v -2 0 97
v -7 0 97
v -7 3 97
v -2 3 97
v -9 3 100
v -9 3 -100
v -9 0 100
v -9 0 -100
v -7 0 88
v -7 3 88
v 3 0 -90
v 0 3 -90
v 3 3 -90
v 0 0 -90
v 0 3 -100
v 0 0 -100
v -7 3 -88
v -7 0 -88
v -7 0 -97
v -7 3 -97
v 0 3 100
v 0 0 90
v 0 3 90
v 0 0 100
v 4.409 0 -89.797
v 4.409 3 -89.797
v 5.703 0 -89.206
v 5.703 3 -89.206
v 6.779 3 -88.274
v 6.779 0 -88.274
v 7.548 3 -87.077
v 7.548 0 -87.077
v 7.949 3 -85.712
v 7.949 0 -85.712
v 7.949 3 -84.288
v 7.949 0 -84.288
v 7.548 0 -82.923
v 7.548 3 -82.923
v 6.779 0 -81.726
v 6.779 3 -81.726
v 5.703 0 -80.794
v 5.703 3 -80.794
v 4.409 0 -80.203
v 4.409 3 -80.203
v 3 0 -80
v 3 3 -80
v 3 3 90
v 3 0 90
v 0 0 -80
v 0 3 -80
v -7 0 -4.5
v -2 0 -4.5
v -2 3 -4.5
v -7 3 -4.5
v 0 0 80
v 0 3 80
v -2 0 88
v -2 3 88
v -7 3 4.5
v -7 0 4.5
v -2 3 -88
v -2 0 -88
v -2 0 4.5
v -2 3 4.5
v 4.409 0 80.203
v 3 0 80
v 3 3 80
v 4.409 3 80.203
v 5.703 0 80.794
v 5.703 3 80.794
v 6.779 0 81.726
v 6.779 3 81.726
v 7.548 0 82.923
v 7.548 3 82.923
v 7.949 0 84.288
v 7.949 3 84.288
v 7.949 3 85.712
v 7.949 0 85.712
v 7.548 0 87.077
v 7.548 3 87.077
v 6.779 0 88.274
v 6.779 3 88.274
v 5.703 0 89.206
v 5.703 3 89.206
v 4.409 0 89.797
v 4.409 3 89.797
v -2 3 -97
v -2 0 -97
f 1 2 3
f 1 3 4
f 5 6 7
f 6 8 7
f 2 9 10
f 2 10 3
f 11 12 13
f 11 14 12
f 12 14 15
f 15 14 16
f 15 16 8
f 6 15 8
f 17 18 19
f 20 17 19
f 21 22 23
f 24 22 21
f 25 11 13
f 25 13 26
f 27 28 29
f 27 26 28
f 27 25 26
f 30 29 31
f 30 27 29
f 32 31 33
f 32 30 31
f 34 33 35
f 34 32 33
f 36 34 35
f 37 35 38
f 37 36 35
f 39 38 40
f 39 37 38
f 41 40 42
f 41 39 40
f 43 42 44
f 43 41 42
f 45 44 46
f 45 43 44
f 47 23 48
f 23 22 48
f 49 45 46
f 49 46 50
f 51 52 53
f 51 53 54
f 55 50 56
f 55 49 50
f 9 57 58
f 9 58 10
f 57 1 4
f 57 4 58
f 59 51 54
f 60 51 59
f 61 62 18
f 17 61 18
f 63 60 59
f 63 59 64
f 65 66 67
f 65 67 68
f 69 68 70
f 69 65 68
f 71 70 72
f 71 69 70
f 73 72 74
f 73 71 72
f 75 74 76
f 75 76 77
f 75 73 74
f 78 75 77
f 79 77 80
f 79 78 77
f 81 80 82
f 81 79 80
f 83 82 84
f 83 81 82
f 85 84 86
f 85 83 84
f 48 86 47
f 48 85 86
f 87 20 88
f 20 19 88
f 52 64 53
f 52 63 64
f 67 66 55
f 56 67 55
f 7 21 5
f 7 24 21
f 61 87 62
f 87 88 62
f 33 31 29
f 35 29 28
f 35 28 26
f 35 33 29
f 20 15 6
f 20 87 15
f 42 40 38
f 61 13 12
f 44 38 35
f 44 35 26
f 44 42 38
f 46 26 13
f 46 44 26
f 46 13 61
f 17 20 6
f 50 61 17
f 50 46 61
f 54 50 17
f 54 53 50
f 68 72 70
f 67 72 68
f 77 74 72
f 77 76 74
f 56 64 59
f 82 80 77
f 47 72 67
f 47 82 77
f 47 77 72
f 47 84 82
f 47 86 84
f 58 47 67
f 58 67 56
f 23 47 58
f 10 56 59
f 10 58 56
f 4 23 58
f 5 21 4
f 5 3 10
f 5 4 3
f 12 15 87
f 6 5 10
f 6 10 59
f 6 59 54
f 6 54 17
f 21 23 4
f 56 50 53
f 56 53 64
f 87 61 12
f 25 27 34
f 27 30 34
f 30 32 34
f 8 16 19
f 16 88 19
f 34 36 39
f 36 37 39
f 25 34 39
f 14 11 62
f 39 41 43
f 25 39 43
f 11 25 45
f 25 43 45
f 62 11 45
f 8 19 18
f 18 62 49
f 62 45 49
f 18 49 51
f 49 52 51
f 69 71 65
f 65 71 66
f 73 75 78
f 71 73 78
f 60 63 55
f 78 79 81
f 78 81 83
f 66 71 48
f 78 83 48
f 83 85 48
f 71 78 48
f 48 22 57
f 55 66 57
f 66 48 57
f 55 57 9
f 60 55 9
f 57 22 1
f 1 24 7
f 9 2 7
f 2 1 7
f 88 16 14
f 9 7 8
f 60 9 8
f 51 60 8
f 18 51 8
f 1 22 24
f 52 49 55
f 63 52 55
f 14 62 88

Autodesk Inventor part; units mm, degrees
ref_plane "YZ Plane" through (0, 0, 0) normal (1, 0, 0) x (0, 1, 0)
ref_plane "XZ Plane" through (0, 0, 0) normal (0, 1, 0) x (-1, 0, 0)
ref_plane "XY Plane" through (0, 0, 0) normal (0, 0, 1) x (1, 0, 0)
sketch "草圖1" plane through (0, 0, 0) normal (0, 1, 0) x (-1, 0, 0)
  line L0 (0, 80) -> (9, 80)
  line L1 (9, 80) -> (9, -80)
  line L2 (9, -80) -> (0, -80)
  line L3 (0, -80) -> (0, 80)
  line L4 (7, 4.5) -> (2, 4.5)
  line L5 (2, 4.5) -> (2, -4.5)
  line L6 (2, -4.5) -> (7, -4.5)
  line L7 (7, -4.5) -> (7, 4.5)
  line L8 (9, 80) -> (9, 90)
  line L9 (9, 90) -> (-3, 90)
  line L10 (-8, 85) -> (-8, 85)
  line L11 (-3, 80) -> (0, 80)
  arc A0 (-8, 85) -> (-3, 80) centre (-3, 85) ccw
  arc A1 (-3, 90) -> (-8, 85) centre (-3, 85) ccw
  circle A2 centre (-3, 85) radius 2.5
  line L12 (9, 0) -> (0, 0)
  line L13 (9, -80) -> (9, -90)
  line L14 (9, -90) -> (-3, -90)
  line L15 (-3, -80) -> (0, -80)
  arc A3 (-3, -80) -> (-8, -85) centre (-3, -85) ccw
  arc A4 (-8, -85) -> (-3, -90) centre (-3, -85) ccw
  circle A5 centre (-3, -85) radius 2.5
  line L16 (9, 90) -> (0, 90)
  line L17 (0, 90) -> (0, 100)
  line L18 (0, 100) -> (9, 100)
  line L19 (9, 100) -> (9, 90)
  line L20 (9, -90) -> (0, -90)
  line L21 (0, -90) -> (0, -100)
  line L22 (0, -100) -> (9, -100)
  line L23 (9, -100) -> (9, -90)
  line L24 (7, 97) -> (2, 97)
  line L25 (2, 97) -> (2, 88)
  line L26 (2, 88) -> (7, 88)
  line L27 (7, 88) -> (7, 97)
  line L28 (7, -97) -> (2, -97)
  line L29 (2, -97) -> (2, -88)
  line L30 (2, -88) -> (7, -88)
  line L31 (7, -88) -> (7, -97)
  point P0 (7, 0)
  point P1 (4.5, 4.5)
  point P2 (4.5, 80)
  point P3 (-8, 90)
  point P4 (-8, -90)
  point P5 (-8, -85)
  point P6 (4.5, 97)
  point P7 (4.5, 100)
  point P8 (4.5, -97)
  dimension "d0" = 160
  dimension "d1" = 9
  dimension "d2" = 9
  dimension "d3" = 5
  dimension "d4" = 10
  dimension "d5" = 17
  dimension "d6" = 5
  dimension "d7" = 5
  dimension "d8" = 5
  dimension "d11" = 9
  dimension "d12" = 10
  dimension "d13" = 10
  dimension "d14" = 9
  dimension "d15" = 5
  dimension "d16" = 9
  dimension "d17" = 3
extrude "擠出1" add sketch "草圖1" along normal blind 3 contours L11 A0 A1 L9 L25 L26 L27 L8 L0 | L0 L1 L12 L7 L4 L5 L3 | L12 L5 L6 L7 L1 L2 L3 | L9 L27 L24 L25 L17 L18 L19 | L2 L13 L14 L31 L30 L29 A4 A3 L15 | L23 L22 L21 L14 L29 L28 L31 | A2 | A5
properties part number "upper_Bar_3" material "木材 (樺木)"
